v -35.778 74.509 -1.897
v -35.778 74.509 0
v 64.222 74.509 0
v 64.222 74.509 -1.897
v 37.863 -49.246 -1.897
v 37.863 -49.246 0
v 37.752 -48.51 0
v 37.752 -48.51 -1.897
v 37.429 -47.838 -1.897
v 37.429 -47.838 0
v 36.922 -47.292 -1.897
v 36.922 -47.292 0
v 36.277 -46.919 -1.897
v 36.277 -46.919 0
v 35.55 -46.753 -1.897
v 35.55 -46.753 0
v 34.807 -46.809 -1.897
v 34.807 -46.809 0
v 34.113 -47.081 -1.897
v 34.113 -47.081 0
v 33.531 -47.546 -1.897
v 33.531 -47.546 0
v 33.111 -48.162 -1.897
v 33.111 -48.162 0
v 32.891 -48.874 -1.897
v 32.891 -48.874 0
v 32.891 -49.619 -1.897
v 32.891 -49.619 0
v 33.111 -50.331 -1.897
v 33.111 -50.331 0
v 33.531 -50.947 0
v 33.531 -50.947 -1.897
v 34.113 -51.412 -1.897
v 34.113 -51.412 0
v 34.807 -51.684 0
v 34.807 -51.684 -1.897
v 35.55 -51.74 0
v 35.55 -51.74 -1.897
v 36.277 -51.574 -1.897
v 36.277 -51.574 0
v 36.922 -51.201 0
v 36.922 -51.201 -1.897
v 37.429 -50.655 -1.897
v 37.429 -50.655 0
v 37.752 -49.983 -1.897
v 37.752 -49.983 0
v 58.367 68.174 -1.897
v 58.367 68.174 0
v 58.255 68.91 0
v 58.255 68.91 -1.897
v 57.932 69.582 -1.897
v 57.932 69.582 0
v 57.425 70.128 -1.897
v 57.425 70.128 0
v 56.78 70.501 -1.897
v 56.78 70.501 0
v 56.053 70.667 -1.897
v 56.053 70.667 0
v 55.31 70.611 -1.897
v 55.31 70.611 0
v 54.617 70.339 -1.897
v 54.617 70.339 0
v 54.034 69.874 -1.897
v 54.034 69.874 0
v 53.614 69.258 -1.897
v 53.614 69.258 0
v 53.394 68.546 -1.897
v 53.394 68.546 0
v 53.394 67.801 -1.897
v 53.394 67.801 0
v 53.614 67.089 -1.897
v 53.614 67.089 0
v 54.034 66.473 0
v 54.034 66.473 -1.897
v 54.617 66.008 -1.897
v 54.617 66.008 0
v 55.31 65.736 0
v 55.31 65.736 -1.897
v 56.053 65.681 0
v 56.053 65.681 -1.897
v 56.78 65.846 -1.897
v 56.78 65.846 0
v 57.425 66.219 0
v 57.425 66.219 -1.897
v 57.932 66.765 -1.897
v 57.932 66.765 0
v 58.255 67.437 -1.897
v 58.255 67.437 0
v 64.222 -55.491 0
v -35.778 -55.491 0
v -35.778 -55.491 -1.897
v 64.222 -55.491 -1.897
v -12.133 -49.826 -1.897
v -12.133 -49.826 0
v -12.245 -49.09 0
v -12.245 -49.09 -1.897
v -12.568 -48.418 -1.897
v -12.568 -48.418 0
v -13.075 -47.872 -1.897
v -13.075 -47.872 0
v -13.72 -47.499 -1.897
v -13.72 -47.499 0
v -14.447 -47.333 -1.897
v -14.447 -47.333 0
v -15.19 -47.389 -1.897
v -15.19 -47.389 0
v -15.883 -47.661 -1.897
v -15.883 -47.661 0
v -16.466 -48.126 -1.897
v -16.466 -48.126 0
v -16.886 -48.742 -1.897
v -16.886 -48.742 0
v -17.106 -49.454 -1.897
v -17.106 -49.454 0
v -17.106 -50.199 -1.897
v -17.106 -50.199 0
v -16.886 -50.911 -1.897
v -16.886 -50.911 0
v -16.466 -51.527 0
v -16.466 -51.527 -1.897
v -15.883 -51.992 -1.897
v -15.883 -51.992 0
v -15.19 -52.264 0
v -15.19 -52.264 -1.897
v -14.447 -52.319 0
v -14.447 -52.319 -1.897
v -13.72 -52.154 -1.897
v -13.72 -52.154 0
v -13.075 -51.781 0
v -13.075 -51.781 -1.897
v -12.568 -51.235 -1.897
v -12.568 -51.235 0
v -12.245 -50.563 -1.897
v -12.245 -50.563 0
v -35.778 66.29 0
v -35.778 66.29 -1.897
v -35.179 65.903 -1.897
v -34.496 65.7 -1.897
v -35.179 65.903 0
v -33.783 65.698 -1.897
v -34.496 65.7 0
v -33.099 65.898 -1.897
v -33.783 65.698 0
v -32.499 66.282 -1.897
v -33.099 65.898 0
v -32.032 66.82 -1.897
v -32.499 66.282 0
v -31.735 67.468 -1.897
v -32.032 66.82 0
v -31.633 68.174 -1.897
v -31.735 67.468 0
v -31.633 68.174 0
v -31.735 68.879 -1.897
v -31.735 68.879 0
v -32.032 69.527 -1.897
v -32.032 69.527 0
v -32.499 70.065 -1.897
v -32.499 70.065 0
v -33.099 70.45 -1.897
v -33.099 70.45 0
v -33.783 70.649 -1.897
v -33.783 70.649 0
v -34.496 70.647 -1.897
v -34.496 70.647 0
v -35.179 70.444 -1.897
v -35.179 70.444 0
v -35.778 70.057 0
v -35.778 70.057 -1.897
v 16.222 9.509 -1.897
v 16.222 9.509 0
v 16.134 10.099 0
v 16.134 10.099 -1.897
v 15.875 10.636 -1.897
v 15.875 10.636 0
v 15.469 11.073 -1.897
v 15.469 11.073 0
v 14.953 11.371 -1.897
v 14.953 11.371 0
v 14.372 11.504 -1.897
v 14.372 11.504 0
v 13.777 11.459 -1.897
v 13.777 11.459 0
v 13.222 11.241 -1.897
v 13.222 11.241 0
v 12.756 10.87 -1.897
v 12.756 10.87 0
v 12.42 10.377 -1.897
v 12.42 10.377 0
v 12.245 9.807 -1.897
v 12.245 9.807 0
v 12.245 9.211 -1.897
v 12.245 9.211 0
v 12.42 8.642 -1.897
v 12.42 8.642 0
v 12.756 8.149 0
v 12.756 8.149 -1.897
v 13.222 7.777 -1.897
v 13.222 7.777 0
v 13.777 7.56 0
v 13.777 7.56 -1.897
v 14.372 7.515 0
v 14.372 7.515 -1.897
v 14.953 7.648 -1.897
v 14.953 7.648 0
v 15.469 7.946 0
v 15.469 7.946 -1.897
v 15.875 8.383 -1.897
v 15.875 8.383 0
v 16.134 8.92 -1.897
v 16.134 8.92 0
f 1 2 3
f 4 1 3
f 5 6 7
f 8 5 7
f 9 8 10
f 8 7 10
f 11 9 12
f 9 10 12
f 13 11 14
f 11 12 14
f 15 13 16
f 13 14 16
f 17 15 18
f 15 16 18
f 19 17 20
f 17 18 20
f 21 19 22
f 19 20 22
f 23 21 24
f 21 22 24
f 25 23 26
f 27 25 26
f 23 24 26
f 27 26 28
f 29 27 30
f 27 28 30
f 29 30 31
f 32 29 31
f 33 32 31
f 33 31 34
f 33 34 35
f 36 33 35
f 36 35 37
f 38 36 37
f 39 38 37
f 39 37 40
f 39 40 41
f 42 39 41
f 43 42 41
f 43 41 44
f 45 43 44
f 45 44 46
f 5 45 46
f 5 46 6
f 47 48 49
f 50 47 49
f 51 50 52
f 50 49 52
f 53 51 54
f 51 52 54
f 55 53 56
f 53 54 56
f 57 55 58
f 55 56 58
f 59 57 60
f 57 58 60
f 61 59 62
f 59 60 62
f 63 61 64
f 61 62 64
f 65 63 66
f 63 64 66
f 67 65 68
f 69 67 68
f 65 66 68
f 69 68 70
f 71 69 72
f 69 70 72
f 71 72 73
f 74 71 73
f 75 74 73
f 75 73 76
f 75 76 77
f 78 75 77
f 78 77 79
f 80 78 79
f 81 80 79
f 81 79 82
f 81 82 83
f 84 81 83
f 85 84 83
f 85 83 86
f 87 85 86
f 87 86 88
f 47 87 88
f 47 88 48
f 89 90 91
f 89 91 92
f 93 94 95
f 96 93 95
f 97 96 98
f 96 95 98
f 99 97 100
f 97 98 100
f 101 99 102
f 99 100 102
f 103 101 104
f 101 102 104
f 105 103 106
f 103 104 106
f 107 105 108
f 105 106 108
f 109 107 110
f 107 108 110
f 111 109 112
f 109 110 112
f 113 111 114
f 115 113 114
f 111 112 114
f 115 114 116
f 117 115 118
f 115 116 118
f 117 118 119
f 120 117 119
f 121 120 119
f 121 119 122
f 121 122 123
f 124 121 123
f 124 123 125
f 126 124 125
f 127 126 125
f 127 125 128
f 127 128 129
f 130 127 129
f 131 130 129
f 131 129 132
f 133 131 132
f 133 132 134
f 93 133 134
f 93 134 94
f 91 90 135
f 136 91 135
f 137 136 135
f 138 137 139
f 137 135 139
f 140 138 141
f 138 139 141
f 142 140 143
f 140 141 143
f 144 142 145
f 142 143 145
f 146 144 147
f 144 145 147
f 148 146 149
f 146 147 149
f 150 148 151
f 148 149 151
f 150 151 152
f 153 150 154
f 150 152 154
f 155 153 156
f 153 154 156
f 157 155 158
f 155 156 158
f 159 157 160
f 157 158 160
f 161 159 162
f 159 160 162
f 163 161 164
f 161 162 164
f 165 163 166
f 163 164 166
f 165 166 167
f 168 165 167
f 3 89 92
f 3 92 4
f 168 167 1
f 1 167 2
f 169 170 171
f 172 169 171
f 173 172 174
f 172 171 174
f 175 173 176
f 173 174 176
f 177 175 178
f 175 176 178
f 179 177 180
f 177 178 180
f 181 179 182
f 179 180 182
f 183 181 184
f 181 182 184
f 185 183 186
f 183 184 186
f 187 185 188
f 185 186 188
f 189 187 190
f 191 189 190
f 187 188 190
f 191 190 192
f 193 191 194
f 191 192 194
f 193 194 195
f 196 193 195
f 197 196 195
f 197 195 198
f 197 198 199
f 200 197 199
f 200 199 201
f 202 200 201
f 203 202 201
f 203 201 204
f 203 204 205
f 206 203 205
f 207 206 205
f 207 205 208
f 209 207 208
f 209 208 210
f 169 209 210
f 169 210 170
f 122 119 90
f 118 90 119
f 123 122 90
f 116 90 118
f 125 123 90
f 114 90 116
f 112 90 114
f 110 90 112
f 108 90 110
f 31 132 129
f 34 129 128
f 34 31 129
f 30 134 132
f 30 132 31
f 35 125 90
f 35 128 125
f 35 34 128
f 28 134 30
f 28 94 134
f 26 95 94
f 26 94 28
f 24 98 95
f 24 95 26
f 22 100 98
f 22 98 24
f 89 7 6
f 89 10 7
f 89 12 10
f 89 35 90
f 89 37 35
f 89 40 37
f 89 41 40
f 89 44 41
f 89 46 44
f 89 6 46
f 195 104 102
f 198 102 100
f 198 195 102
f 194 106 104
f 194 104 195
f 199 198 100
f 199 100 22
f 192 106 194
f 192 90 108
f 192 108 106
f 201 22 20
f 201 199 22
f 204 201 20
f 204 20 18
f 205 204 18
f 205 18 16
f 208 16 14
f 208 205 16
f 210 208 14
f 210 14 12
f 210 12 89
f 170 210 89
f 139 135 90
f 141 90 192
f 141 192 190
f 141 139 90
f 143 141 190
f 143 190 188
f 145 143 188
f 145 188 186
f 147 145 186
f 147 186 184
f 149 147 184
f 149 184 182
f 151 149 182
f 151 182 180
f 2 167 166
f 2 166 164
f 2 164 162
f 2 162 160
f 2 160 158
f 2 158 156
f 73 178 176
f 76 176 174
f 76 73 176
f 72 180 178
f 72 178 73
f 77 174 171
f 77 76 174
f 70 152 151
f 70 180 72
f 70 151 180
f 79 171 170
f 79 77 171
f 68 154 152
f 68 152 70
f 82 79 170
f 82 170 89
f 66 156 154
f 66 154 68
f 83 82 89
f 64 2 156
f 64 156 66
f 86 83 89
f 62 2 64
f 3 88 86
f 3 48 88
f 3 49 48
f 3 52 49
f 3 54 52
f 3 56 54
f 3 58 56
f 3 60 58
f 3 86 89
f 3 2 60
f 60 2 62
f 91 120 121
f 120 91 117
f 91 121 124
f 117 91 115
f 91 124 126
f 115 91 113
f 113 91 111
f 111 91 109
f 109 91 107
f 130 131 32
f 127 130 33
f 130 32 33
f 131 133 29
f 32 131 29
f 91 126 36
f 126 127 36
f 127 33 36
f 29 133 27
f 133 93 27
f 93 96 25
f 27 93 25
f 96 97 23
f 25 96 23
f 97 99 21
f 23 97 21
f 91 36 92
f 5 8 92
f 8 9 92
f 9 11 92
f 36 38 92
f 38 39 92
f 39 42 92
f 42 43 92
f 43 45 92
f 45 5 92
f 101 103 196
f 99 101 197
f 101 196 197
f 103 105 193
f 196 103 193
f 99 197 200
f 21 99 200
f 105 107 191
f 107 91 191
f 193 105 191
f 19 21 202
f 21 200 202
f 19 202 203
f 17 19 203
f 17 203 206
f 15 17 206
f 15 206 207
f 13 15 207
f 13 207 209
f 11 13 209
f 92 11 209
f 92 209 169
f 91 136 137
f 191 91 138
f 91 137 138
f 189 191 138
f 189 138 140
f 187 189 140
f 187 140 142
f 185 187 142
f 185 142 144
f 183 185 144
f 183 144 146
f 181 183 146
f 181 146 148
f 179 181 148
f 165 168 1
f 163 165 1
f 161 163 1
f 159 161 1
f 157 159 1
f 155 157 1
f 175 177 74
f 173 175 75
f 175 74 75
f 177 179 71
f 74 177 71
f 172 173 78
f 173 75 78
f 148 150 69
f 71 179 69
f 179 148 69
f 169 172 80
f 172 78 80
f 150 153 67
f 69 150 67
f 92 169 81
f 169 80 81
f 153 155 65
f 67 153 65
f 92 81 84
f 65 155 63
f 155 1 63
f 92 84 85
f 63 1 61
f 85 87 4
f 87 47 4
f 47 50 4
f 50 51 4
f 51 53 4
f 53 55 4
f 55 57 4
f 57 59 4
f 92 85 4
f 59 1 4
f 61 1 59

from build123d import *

# Parameters (mm, degrees)
SKETCH1_W          = 100
SKETCH1_H          = 130
BASE_FLANGE1_DEPTH = 1.89738
SKETCH6_R          = 2.5
SKETCH6_R_2        = 2
CUT_EXTRUDE1_DEPTH = 2


# Sheet-metal steps are written as plain solids
with BuildPart() as part:
    # Sketch1 → Base-Flange1 (new body)
    with BuildSketch(Plane.XY):
        with Locations((14.222394098, 9.509380067)):
            Rectangle(SKETCH1_W, SKETCH1_H)
    extrude(amount=-BASE_FLANGE1_DEPTH)

    # Sketch6 → Cut-Extrude1 (cut)
    with BuildSketch(Plane.XY):
        with Locations((-34.133449647, 68.173545131)):
            Circle(SKETCH6_R)
        with Locations((55.866550353, 68.173545131)):
            Circle(SKETCH6_R)
        with Locations((35.363186693, -49.246493887)):
            Circle(SKETCH6_R)
        with Locations((-14.633449647, -49.826454869)):
            Circle(SKETCH6_R)
        with Locations((14.222394098, 9.509380067)):
            Circle(SKETCH6_R_2)
    extrude(amount=-CUT_EXTRUDE1_DEPTH, mode=Mode.SUBTRACT)


solid = part.part
